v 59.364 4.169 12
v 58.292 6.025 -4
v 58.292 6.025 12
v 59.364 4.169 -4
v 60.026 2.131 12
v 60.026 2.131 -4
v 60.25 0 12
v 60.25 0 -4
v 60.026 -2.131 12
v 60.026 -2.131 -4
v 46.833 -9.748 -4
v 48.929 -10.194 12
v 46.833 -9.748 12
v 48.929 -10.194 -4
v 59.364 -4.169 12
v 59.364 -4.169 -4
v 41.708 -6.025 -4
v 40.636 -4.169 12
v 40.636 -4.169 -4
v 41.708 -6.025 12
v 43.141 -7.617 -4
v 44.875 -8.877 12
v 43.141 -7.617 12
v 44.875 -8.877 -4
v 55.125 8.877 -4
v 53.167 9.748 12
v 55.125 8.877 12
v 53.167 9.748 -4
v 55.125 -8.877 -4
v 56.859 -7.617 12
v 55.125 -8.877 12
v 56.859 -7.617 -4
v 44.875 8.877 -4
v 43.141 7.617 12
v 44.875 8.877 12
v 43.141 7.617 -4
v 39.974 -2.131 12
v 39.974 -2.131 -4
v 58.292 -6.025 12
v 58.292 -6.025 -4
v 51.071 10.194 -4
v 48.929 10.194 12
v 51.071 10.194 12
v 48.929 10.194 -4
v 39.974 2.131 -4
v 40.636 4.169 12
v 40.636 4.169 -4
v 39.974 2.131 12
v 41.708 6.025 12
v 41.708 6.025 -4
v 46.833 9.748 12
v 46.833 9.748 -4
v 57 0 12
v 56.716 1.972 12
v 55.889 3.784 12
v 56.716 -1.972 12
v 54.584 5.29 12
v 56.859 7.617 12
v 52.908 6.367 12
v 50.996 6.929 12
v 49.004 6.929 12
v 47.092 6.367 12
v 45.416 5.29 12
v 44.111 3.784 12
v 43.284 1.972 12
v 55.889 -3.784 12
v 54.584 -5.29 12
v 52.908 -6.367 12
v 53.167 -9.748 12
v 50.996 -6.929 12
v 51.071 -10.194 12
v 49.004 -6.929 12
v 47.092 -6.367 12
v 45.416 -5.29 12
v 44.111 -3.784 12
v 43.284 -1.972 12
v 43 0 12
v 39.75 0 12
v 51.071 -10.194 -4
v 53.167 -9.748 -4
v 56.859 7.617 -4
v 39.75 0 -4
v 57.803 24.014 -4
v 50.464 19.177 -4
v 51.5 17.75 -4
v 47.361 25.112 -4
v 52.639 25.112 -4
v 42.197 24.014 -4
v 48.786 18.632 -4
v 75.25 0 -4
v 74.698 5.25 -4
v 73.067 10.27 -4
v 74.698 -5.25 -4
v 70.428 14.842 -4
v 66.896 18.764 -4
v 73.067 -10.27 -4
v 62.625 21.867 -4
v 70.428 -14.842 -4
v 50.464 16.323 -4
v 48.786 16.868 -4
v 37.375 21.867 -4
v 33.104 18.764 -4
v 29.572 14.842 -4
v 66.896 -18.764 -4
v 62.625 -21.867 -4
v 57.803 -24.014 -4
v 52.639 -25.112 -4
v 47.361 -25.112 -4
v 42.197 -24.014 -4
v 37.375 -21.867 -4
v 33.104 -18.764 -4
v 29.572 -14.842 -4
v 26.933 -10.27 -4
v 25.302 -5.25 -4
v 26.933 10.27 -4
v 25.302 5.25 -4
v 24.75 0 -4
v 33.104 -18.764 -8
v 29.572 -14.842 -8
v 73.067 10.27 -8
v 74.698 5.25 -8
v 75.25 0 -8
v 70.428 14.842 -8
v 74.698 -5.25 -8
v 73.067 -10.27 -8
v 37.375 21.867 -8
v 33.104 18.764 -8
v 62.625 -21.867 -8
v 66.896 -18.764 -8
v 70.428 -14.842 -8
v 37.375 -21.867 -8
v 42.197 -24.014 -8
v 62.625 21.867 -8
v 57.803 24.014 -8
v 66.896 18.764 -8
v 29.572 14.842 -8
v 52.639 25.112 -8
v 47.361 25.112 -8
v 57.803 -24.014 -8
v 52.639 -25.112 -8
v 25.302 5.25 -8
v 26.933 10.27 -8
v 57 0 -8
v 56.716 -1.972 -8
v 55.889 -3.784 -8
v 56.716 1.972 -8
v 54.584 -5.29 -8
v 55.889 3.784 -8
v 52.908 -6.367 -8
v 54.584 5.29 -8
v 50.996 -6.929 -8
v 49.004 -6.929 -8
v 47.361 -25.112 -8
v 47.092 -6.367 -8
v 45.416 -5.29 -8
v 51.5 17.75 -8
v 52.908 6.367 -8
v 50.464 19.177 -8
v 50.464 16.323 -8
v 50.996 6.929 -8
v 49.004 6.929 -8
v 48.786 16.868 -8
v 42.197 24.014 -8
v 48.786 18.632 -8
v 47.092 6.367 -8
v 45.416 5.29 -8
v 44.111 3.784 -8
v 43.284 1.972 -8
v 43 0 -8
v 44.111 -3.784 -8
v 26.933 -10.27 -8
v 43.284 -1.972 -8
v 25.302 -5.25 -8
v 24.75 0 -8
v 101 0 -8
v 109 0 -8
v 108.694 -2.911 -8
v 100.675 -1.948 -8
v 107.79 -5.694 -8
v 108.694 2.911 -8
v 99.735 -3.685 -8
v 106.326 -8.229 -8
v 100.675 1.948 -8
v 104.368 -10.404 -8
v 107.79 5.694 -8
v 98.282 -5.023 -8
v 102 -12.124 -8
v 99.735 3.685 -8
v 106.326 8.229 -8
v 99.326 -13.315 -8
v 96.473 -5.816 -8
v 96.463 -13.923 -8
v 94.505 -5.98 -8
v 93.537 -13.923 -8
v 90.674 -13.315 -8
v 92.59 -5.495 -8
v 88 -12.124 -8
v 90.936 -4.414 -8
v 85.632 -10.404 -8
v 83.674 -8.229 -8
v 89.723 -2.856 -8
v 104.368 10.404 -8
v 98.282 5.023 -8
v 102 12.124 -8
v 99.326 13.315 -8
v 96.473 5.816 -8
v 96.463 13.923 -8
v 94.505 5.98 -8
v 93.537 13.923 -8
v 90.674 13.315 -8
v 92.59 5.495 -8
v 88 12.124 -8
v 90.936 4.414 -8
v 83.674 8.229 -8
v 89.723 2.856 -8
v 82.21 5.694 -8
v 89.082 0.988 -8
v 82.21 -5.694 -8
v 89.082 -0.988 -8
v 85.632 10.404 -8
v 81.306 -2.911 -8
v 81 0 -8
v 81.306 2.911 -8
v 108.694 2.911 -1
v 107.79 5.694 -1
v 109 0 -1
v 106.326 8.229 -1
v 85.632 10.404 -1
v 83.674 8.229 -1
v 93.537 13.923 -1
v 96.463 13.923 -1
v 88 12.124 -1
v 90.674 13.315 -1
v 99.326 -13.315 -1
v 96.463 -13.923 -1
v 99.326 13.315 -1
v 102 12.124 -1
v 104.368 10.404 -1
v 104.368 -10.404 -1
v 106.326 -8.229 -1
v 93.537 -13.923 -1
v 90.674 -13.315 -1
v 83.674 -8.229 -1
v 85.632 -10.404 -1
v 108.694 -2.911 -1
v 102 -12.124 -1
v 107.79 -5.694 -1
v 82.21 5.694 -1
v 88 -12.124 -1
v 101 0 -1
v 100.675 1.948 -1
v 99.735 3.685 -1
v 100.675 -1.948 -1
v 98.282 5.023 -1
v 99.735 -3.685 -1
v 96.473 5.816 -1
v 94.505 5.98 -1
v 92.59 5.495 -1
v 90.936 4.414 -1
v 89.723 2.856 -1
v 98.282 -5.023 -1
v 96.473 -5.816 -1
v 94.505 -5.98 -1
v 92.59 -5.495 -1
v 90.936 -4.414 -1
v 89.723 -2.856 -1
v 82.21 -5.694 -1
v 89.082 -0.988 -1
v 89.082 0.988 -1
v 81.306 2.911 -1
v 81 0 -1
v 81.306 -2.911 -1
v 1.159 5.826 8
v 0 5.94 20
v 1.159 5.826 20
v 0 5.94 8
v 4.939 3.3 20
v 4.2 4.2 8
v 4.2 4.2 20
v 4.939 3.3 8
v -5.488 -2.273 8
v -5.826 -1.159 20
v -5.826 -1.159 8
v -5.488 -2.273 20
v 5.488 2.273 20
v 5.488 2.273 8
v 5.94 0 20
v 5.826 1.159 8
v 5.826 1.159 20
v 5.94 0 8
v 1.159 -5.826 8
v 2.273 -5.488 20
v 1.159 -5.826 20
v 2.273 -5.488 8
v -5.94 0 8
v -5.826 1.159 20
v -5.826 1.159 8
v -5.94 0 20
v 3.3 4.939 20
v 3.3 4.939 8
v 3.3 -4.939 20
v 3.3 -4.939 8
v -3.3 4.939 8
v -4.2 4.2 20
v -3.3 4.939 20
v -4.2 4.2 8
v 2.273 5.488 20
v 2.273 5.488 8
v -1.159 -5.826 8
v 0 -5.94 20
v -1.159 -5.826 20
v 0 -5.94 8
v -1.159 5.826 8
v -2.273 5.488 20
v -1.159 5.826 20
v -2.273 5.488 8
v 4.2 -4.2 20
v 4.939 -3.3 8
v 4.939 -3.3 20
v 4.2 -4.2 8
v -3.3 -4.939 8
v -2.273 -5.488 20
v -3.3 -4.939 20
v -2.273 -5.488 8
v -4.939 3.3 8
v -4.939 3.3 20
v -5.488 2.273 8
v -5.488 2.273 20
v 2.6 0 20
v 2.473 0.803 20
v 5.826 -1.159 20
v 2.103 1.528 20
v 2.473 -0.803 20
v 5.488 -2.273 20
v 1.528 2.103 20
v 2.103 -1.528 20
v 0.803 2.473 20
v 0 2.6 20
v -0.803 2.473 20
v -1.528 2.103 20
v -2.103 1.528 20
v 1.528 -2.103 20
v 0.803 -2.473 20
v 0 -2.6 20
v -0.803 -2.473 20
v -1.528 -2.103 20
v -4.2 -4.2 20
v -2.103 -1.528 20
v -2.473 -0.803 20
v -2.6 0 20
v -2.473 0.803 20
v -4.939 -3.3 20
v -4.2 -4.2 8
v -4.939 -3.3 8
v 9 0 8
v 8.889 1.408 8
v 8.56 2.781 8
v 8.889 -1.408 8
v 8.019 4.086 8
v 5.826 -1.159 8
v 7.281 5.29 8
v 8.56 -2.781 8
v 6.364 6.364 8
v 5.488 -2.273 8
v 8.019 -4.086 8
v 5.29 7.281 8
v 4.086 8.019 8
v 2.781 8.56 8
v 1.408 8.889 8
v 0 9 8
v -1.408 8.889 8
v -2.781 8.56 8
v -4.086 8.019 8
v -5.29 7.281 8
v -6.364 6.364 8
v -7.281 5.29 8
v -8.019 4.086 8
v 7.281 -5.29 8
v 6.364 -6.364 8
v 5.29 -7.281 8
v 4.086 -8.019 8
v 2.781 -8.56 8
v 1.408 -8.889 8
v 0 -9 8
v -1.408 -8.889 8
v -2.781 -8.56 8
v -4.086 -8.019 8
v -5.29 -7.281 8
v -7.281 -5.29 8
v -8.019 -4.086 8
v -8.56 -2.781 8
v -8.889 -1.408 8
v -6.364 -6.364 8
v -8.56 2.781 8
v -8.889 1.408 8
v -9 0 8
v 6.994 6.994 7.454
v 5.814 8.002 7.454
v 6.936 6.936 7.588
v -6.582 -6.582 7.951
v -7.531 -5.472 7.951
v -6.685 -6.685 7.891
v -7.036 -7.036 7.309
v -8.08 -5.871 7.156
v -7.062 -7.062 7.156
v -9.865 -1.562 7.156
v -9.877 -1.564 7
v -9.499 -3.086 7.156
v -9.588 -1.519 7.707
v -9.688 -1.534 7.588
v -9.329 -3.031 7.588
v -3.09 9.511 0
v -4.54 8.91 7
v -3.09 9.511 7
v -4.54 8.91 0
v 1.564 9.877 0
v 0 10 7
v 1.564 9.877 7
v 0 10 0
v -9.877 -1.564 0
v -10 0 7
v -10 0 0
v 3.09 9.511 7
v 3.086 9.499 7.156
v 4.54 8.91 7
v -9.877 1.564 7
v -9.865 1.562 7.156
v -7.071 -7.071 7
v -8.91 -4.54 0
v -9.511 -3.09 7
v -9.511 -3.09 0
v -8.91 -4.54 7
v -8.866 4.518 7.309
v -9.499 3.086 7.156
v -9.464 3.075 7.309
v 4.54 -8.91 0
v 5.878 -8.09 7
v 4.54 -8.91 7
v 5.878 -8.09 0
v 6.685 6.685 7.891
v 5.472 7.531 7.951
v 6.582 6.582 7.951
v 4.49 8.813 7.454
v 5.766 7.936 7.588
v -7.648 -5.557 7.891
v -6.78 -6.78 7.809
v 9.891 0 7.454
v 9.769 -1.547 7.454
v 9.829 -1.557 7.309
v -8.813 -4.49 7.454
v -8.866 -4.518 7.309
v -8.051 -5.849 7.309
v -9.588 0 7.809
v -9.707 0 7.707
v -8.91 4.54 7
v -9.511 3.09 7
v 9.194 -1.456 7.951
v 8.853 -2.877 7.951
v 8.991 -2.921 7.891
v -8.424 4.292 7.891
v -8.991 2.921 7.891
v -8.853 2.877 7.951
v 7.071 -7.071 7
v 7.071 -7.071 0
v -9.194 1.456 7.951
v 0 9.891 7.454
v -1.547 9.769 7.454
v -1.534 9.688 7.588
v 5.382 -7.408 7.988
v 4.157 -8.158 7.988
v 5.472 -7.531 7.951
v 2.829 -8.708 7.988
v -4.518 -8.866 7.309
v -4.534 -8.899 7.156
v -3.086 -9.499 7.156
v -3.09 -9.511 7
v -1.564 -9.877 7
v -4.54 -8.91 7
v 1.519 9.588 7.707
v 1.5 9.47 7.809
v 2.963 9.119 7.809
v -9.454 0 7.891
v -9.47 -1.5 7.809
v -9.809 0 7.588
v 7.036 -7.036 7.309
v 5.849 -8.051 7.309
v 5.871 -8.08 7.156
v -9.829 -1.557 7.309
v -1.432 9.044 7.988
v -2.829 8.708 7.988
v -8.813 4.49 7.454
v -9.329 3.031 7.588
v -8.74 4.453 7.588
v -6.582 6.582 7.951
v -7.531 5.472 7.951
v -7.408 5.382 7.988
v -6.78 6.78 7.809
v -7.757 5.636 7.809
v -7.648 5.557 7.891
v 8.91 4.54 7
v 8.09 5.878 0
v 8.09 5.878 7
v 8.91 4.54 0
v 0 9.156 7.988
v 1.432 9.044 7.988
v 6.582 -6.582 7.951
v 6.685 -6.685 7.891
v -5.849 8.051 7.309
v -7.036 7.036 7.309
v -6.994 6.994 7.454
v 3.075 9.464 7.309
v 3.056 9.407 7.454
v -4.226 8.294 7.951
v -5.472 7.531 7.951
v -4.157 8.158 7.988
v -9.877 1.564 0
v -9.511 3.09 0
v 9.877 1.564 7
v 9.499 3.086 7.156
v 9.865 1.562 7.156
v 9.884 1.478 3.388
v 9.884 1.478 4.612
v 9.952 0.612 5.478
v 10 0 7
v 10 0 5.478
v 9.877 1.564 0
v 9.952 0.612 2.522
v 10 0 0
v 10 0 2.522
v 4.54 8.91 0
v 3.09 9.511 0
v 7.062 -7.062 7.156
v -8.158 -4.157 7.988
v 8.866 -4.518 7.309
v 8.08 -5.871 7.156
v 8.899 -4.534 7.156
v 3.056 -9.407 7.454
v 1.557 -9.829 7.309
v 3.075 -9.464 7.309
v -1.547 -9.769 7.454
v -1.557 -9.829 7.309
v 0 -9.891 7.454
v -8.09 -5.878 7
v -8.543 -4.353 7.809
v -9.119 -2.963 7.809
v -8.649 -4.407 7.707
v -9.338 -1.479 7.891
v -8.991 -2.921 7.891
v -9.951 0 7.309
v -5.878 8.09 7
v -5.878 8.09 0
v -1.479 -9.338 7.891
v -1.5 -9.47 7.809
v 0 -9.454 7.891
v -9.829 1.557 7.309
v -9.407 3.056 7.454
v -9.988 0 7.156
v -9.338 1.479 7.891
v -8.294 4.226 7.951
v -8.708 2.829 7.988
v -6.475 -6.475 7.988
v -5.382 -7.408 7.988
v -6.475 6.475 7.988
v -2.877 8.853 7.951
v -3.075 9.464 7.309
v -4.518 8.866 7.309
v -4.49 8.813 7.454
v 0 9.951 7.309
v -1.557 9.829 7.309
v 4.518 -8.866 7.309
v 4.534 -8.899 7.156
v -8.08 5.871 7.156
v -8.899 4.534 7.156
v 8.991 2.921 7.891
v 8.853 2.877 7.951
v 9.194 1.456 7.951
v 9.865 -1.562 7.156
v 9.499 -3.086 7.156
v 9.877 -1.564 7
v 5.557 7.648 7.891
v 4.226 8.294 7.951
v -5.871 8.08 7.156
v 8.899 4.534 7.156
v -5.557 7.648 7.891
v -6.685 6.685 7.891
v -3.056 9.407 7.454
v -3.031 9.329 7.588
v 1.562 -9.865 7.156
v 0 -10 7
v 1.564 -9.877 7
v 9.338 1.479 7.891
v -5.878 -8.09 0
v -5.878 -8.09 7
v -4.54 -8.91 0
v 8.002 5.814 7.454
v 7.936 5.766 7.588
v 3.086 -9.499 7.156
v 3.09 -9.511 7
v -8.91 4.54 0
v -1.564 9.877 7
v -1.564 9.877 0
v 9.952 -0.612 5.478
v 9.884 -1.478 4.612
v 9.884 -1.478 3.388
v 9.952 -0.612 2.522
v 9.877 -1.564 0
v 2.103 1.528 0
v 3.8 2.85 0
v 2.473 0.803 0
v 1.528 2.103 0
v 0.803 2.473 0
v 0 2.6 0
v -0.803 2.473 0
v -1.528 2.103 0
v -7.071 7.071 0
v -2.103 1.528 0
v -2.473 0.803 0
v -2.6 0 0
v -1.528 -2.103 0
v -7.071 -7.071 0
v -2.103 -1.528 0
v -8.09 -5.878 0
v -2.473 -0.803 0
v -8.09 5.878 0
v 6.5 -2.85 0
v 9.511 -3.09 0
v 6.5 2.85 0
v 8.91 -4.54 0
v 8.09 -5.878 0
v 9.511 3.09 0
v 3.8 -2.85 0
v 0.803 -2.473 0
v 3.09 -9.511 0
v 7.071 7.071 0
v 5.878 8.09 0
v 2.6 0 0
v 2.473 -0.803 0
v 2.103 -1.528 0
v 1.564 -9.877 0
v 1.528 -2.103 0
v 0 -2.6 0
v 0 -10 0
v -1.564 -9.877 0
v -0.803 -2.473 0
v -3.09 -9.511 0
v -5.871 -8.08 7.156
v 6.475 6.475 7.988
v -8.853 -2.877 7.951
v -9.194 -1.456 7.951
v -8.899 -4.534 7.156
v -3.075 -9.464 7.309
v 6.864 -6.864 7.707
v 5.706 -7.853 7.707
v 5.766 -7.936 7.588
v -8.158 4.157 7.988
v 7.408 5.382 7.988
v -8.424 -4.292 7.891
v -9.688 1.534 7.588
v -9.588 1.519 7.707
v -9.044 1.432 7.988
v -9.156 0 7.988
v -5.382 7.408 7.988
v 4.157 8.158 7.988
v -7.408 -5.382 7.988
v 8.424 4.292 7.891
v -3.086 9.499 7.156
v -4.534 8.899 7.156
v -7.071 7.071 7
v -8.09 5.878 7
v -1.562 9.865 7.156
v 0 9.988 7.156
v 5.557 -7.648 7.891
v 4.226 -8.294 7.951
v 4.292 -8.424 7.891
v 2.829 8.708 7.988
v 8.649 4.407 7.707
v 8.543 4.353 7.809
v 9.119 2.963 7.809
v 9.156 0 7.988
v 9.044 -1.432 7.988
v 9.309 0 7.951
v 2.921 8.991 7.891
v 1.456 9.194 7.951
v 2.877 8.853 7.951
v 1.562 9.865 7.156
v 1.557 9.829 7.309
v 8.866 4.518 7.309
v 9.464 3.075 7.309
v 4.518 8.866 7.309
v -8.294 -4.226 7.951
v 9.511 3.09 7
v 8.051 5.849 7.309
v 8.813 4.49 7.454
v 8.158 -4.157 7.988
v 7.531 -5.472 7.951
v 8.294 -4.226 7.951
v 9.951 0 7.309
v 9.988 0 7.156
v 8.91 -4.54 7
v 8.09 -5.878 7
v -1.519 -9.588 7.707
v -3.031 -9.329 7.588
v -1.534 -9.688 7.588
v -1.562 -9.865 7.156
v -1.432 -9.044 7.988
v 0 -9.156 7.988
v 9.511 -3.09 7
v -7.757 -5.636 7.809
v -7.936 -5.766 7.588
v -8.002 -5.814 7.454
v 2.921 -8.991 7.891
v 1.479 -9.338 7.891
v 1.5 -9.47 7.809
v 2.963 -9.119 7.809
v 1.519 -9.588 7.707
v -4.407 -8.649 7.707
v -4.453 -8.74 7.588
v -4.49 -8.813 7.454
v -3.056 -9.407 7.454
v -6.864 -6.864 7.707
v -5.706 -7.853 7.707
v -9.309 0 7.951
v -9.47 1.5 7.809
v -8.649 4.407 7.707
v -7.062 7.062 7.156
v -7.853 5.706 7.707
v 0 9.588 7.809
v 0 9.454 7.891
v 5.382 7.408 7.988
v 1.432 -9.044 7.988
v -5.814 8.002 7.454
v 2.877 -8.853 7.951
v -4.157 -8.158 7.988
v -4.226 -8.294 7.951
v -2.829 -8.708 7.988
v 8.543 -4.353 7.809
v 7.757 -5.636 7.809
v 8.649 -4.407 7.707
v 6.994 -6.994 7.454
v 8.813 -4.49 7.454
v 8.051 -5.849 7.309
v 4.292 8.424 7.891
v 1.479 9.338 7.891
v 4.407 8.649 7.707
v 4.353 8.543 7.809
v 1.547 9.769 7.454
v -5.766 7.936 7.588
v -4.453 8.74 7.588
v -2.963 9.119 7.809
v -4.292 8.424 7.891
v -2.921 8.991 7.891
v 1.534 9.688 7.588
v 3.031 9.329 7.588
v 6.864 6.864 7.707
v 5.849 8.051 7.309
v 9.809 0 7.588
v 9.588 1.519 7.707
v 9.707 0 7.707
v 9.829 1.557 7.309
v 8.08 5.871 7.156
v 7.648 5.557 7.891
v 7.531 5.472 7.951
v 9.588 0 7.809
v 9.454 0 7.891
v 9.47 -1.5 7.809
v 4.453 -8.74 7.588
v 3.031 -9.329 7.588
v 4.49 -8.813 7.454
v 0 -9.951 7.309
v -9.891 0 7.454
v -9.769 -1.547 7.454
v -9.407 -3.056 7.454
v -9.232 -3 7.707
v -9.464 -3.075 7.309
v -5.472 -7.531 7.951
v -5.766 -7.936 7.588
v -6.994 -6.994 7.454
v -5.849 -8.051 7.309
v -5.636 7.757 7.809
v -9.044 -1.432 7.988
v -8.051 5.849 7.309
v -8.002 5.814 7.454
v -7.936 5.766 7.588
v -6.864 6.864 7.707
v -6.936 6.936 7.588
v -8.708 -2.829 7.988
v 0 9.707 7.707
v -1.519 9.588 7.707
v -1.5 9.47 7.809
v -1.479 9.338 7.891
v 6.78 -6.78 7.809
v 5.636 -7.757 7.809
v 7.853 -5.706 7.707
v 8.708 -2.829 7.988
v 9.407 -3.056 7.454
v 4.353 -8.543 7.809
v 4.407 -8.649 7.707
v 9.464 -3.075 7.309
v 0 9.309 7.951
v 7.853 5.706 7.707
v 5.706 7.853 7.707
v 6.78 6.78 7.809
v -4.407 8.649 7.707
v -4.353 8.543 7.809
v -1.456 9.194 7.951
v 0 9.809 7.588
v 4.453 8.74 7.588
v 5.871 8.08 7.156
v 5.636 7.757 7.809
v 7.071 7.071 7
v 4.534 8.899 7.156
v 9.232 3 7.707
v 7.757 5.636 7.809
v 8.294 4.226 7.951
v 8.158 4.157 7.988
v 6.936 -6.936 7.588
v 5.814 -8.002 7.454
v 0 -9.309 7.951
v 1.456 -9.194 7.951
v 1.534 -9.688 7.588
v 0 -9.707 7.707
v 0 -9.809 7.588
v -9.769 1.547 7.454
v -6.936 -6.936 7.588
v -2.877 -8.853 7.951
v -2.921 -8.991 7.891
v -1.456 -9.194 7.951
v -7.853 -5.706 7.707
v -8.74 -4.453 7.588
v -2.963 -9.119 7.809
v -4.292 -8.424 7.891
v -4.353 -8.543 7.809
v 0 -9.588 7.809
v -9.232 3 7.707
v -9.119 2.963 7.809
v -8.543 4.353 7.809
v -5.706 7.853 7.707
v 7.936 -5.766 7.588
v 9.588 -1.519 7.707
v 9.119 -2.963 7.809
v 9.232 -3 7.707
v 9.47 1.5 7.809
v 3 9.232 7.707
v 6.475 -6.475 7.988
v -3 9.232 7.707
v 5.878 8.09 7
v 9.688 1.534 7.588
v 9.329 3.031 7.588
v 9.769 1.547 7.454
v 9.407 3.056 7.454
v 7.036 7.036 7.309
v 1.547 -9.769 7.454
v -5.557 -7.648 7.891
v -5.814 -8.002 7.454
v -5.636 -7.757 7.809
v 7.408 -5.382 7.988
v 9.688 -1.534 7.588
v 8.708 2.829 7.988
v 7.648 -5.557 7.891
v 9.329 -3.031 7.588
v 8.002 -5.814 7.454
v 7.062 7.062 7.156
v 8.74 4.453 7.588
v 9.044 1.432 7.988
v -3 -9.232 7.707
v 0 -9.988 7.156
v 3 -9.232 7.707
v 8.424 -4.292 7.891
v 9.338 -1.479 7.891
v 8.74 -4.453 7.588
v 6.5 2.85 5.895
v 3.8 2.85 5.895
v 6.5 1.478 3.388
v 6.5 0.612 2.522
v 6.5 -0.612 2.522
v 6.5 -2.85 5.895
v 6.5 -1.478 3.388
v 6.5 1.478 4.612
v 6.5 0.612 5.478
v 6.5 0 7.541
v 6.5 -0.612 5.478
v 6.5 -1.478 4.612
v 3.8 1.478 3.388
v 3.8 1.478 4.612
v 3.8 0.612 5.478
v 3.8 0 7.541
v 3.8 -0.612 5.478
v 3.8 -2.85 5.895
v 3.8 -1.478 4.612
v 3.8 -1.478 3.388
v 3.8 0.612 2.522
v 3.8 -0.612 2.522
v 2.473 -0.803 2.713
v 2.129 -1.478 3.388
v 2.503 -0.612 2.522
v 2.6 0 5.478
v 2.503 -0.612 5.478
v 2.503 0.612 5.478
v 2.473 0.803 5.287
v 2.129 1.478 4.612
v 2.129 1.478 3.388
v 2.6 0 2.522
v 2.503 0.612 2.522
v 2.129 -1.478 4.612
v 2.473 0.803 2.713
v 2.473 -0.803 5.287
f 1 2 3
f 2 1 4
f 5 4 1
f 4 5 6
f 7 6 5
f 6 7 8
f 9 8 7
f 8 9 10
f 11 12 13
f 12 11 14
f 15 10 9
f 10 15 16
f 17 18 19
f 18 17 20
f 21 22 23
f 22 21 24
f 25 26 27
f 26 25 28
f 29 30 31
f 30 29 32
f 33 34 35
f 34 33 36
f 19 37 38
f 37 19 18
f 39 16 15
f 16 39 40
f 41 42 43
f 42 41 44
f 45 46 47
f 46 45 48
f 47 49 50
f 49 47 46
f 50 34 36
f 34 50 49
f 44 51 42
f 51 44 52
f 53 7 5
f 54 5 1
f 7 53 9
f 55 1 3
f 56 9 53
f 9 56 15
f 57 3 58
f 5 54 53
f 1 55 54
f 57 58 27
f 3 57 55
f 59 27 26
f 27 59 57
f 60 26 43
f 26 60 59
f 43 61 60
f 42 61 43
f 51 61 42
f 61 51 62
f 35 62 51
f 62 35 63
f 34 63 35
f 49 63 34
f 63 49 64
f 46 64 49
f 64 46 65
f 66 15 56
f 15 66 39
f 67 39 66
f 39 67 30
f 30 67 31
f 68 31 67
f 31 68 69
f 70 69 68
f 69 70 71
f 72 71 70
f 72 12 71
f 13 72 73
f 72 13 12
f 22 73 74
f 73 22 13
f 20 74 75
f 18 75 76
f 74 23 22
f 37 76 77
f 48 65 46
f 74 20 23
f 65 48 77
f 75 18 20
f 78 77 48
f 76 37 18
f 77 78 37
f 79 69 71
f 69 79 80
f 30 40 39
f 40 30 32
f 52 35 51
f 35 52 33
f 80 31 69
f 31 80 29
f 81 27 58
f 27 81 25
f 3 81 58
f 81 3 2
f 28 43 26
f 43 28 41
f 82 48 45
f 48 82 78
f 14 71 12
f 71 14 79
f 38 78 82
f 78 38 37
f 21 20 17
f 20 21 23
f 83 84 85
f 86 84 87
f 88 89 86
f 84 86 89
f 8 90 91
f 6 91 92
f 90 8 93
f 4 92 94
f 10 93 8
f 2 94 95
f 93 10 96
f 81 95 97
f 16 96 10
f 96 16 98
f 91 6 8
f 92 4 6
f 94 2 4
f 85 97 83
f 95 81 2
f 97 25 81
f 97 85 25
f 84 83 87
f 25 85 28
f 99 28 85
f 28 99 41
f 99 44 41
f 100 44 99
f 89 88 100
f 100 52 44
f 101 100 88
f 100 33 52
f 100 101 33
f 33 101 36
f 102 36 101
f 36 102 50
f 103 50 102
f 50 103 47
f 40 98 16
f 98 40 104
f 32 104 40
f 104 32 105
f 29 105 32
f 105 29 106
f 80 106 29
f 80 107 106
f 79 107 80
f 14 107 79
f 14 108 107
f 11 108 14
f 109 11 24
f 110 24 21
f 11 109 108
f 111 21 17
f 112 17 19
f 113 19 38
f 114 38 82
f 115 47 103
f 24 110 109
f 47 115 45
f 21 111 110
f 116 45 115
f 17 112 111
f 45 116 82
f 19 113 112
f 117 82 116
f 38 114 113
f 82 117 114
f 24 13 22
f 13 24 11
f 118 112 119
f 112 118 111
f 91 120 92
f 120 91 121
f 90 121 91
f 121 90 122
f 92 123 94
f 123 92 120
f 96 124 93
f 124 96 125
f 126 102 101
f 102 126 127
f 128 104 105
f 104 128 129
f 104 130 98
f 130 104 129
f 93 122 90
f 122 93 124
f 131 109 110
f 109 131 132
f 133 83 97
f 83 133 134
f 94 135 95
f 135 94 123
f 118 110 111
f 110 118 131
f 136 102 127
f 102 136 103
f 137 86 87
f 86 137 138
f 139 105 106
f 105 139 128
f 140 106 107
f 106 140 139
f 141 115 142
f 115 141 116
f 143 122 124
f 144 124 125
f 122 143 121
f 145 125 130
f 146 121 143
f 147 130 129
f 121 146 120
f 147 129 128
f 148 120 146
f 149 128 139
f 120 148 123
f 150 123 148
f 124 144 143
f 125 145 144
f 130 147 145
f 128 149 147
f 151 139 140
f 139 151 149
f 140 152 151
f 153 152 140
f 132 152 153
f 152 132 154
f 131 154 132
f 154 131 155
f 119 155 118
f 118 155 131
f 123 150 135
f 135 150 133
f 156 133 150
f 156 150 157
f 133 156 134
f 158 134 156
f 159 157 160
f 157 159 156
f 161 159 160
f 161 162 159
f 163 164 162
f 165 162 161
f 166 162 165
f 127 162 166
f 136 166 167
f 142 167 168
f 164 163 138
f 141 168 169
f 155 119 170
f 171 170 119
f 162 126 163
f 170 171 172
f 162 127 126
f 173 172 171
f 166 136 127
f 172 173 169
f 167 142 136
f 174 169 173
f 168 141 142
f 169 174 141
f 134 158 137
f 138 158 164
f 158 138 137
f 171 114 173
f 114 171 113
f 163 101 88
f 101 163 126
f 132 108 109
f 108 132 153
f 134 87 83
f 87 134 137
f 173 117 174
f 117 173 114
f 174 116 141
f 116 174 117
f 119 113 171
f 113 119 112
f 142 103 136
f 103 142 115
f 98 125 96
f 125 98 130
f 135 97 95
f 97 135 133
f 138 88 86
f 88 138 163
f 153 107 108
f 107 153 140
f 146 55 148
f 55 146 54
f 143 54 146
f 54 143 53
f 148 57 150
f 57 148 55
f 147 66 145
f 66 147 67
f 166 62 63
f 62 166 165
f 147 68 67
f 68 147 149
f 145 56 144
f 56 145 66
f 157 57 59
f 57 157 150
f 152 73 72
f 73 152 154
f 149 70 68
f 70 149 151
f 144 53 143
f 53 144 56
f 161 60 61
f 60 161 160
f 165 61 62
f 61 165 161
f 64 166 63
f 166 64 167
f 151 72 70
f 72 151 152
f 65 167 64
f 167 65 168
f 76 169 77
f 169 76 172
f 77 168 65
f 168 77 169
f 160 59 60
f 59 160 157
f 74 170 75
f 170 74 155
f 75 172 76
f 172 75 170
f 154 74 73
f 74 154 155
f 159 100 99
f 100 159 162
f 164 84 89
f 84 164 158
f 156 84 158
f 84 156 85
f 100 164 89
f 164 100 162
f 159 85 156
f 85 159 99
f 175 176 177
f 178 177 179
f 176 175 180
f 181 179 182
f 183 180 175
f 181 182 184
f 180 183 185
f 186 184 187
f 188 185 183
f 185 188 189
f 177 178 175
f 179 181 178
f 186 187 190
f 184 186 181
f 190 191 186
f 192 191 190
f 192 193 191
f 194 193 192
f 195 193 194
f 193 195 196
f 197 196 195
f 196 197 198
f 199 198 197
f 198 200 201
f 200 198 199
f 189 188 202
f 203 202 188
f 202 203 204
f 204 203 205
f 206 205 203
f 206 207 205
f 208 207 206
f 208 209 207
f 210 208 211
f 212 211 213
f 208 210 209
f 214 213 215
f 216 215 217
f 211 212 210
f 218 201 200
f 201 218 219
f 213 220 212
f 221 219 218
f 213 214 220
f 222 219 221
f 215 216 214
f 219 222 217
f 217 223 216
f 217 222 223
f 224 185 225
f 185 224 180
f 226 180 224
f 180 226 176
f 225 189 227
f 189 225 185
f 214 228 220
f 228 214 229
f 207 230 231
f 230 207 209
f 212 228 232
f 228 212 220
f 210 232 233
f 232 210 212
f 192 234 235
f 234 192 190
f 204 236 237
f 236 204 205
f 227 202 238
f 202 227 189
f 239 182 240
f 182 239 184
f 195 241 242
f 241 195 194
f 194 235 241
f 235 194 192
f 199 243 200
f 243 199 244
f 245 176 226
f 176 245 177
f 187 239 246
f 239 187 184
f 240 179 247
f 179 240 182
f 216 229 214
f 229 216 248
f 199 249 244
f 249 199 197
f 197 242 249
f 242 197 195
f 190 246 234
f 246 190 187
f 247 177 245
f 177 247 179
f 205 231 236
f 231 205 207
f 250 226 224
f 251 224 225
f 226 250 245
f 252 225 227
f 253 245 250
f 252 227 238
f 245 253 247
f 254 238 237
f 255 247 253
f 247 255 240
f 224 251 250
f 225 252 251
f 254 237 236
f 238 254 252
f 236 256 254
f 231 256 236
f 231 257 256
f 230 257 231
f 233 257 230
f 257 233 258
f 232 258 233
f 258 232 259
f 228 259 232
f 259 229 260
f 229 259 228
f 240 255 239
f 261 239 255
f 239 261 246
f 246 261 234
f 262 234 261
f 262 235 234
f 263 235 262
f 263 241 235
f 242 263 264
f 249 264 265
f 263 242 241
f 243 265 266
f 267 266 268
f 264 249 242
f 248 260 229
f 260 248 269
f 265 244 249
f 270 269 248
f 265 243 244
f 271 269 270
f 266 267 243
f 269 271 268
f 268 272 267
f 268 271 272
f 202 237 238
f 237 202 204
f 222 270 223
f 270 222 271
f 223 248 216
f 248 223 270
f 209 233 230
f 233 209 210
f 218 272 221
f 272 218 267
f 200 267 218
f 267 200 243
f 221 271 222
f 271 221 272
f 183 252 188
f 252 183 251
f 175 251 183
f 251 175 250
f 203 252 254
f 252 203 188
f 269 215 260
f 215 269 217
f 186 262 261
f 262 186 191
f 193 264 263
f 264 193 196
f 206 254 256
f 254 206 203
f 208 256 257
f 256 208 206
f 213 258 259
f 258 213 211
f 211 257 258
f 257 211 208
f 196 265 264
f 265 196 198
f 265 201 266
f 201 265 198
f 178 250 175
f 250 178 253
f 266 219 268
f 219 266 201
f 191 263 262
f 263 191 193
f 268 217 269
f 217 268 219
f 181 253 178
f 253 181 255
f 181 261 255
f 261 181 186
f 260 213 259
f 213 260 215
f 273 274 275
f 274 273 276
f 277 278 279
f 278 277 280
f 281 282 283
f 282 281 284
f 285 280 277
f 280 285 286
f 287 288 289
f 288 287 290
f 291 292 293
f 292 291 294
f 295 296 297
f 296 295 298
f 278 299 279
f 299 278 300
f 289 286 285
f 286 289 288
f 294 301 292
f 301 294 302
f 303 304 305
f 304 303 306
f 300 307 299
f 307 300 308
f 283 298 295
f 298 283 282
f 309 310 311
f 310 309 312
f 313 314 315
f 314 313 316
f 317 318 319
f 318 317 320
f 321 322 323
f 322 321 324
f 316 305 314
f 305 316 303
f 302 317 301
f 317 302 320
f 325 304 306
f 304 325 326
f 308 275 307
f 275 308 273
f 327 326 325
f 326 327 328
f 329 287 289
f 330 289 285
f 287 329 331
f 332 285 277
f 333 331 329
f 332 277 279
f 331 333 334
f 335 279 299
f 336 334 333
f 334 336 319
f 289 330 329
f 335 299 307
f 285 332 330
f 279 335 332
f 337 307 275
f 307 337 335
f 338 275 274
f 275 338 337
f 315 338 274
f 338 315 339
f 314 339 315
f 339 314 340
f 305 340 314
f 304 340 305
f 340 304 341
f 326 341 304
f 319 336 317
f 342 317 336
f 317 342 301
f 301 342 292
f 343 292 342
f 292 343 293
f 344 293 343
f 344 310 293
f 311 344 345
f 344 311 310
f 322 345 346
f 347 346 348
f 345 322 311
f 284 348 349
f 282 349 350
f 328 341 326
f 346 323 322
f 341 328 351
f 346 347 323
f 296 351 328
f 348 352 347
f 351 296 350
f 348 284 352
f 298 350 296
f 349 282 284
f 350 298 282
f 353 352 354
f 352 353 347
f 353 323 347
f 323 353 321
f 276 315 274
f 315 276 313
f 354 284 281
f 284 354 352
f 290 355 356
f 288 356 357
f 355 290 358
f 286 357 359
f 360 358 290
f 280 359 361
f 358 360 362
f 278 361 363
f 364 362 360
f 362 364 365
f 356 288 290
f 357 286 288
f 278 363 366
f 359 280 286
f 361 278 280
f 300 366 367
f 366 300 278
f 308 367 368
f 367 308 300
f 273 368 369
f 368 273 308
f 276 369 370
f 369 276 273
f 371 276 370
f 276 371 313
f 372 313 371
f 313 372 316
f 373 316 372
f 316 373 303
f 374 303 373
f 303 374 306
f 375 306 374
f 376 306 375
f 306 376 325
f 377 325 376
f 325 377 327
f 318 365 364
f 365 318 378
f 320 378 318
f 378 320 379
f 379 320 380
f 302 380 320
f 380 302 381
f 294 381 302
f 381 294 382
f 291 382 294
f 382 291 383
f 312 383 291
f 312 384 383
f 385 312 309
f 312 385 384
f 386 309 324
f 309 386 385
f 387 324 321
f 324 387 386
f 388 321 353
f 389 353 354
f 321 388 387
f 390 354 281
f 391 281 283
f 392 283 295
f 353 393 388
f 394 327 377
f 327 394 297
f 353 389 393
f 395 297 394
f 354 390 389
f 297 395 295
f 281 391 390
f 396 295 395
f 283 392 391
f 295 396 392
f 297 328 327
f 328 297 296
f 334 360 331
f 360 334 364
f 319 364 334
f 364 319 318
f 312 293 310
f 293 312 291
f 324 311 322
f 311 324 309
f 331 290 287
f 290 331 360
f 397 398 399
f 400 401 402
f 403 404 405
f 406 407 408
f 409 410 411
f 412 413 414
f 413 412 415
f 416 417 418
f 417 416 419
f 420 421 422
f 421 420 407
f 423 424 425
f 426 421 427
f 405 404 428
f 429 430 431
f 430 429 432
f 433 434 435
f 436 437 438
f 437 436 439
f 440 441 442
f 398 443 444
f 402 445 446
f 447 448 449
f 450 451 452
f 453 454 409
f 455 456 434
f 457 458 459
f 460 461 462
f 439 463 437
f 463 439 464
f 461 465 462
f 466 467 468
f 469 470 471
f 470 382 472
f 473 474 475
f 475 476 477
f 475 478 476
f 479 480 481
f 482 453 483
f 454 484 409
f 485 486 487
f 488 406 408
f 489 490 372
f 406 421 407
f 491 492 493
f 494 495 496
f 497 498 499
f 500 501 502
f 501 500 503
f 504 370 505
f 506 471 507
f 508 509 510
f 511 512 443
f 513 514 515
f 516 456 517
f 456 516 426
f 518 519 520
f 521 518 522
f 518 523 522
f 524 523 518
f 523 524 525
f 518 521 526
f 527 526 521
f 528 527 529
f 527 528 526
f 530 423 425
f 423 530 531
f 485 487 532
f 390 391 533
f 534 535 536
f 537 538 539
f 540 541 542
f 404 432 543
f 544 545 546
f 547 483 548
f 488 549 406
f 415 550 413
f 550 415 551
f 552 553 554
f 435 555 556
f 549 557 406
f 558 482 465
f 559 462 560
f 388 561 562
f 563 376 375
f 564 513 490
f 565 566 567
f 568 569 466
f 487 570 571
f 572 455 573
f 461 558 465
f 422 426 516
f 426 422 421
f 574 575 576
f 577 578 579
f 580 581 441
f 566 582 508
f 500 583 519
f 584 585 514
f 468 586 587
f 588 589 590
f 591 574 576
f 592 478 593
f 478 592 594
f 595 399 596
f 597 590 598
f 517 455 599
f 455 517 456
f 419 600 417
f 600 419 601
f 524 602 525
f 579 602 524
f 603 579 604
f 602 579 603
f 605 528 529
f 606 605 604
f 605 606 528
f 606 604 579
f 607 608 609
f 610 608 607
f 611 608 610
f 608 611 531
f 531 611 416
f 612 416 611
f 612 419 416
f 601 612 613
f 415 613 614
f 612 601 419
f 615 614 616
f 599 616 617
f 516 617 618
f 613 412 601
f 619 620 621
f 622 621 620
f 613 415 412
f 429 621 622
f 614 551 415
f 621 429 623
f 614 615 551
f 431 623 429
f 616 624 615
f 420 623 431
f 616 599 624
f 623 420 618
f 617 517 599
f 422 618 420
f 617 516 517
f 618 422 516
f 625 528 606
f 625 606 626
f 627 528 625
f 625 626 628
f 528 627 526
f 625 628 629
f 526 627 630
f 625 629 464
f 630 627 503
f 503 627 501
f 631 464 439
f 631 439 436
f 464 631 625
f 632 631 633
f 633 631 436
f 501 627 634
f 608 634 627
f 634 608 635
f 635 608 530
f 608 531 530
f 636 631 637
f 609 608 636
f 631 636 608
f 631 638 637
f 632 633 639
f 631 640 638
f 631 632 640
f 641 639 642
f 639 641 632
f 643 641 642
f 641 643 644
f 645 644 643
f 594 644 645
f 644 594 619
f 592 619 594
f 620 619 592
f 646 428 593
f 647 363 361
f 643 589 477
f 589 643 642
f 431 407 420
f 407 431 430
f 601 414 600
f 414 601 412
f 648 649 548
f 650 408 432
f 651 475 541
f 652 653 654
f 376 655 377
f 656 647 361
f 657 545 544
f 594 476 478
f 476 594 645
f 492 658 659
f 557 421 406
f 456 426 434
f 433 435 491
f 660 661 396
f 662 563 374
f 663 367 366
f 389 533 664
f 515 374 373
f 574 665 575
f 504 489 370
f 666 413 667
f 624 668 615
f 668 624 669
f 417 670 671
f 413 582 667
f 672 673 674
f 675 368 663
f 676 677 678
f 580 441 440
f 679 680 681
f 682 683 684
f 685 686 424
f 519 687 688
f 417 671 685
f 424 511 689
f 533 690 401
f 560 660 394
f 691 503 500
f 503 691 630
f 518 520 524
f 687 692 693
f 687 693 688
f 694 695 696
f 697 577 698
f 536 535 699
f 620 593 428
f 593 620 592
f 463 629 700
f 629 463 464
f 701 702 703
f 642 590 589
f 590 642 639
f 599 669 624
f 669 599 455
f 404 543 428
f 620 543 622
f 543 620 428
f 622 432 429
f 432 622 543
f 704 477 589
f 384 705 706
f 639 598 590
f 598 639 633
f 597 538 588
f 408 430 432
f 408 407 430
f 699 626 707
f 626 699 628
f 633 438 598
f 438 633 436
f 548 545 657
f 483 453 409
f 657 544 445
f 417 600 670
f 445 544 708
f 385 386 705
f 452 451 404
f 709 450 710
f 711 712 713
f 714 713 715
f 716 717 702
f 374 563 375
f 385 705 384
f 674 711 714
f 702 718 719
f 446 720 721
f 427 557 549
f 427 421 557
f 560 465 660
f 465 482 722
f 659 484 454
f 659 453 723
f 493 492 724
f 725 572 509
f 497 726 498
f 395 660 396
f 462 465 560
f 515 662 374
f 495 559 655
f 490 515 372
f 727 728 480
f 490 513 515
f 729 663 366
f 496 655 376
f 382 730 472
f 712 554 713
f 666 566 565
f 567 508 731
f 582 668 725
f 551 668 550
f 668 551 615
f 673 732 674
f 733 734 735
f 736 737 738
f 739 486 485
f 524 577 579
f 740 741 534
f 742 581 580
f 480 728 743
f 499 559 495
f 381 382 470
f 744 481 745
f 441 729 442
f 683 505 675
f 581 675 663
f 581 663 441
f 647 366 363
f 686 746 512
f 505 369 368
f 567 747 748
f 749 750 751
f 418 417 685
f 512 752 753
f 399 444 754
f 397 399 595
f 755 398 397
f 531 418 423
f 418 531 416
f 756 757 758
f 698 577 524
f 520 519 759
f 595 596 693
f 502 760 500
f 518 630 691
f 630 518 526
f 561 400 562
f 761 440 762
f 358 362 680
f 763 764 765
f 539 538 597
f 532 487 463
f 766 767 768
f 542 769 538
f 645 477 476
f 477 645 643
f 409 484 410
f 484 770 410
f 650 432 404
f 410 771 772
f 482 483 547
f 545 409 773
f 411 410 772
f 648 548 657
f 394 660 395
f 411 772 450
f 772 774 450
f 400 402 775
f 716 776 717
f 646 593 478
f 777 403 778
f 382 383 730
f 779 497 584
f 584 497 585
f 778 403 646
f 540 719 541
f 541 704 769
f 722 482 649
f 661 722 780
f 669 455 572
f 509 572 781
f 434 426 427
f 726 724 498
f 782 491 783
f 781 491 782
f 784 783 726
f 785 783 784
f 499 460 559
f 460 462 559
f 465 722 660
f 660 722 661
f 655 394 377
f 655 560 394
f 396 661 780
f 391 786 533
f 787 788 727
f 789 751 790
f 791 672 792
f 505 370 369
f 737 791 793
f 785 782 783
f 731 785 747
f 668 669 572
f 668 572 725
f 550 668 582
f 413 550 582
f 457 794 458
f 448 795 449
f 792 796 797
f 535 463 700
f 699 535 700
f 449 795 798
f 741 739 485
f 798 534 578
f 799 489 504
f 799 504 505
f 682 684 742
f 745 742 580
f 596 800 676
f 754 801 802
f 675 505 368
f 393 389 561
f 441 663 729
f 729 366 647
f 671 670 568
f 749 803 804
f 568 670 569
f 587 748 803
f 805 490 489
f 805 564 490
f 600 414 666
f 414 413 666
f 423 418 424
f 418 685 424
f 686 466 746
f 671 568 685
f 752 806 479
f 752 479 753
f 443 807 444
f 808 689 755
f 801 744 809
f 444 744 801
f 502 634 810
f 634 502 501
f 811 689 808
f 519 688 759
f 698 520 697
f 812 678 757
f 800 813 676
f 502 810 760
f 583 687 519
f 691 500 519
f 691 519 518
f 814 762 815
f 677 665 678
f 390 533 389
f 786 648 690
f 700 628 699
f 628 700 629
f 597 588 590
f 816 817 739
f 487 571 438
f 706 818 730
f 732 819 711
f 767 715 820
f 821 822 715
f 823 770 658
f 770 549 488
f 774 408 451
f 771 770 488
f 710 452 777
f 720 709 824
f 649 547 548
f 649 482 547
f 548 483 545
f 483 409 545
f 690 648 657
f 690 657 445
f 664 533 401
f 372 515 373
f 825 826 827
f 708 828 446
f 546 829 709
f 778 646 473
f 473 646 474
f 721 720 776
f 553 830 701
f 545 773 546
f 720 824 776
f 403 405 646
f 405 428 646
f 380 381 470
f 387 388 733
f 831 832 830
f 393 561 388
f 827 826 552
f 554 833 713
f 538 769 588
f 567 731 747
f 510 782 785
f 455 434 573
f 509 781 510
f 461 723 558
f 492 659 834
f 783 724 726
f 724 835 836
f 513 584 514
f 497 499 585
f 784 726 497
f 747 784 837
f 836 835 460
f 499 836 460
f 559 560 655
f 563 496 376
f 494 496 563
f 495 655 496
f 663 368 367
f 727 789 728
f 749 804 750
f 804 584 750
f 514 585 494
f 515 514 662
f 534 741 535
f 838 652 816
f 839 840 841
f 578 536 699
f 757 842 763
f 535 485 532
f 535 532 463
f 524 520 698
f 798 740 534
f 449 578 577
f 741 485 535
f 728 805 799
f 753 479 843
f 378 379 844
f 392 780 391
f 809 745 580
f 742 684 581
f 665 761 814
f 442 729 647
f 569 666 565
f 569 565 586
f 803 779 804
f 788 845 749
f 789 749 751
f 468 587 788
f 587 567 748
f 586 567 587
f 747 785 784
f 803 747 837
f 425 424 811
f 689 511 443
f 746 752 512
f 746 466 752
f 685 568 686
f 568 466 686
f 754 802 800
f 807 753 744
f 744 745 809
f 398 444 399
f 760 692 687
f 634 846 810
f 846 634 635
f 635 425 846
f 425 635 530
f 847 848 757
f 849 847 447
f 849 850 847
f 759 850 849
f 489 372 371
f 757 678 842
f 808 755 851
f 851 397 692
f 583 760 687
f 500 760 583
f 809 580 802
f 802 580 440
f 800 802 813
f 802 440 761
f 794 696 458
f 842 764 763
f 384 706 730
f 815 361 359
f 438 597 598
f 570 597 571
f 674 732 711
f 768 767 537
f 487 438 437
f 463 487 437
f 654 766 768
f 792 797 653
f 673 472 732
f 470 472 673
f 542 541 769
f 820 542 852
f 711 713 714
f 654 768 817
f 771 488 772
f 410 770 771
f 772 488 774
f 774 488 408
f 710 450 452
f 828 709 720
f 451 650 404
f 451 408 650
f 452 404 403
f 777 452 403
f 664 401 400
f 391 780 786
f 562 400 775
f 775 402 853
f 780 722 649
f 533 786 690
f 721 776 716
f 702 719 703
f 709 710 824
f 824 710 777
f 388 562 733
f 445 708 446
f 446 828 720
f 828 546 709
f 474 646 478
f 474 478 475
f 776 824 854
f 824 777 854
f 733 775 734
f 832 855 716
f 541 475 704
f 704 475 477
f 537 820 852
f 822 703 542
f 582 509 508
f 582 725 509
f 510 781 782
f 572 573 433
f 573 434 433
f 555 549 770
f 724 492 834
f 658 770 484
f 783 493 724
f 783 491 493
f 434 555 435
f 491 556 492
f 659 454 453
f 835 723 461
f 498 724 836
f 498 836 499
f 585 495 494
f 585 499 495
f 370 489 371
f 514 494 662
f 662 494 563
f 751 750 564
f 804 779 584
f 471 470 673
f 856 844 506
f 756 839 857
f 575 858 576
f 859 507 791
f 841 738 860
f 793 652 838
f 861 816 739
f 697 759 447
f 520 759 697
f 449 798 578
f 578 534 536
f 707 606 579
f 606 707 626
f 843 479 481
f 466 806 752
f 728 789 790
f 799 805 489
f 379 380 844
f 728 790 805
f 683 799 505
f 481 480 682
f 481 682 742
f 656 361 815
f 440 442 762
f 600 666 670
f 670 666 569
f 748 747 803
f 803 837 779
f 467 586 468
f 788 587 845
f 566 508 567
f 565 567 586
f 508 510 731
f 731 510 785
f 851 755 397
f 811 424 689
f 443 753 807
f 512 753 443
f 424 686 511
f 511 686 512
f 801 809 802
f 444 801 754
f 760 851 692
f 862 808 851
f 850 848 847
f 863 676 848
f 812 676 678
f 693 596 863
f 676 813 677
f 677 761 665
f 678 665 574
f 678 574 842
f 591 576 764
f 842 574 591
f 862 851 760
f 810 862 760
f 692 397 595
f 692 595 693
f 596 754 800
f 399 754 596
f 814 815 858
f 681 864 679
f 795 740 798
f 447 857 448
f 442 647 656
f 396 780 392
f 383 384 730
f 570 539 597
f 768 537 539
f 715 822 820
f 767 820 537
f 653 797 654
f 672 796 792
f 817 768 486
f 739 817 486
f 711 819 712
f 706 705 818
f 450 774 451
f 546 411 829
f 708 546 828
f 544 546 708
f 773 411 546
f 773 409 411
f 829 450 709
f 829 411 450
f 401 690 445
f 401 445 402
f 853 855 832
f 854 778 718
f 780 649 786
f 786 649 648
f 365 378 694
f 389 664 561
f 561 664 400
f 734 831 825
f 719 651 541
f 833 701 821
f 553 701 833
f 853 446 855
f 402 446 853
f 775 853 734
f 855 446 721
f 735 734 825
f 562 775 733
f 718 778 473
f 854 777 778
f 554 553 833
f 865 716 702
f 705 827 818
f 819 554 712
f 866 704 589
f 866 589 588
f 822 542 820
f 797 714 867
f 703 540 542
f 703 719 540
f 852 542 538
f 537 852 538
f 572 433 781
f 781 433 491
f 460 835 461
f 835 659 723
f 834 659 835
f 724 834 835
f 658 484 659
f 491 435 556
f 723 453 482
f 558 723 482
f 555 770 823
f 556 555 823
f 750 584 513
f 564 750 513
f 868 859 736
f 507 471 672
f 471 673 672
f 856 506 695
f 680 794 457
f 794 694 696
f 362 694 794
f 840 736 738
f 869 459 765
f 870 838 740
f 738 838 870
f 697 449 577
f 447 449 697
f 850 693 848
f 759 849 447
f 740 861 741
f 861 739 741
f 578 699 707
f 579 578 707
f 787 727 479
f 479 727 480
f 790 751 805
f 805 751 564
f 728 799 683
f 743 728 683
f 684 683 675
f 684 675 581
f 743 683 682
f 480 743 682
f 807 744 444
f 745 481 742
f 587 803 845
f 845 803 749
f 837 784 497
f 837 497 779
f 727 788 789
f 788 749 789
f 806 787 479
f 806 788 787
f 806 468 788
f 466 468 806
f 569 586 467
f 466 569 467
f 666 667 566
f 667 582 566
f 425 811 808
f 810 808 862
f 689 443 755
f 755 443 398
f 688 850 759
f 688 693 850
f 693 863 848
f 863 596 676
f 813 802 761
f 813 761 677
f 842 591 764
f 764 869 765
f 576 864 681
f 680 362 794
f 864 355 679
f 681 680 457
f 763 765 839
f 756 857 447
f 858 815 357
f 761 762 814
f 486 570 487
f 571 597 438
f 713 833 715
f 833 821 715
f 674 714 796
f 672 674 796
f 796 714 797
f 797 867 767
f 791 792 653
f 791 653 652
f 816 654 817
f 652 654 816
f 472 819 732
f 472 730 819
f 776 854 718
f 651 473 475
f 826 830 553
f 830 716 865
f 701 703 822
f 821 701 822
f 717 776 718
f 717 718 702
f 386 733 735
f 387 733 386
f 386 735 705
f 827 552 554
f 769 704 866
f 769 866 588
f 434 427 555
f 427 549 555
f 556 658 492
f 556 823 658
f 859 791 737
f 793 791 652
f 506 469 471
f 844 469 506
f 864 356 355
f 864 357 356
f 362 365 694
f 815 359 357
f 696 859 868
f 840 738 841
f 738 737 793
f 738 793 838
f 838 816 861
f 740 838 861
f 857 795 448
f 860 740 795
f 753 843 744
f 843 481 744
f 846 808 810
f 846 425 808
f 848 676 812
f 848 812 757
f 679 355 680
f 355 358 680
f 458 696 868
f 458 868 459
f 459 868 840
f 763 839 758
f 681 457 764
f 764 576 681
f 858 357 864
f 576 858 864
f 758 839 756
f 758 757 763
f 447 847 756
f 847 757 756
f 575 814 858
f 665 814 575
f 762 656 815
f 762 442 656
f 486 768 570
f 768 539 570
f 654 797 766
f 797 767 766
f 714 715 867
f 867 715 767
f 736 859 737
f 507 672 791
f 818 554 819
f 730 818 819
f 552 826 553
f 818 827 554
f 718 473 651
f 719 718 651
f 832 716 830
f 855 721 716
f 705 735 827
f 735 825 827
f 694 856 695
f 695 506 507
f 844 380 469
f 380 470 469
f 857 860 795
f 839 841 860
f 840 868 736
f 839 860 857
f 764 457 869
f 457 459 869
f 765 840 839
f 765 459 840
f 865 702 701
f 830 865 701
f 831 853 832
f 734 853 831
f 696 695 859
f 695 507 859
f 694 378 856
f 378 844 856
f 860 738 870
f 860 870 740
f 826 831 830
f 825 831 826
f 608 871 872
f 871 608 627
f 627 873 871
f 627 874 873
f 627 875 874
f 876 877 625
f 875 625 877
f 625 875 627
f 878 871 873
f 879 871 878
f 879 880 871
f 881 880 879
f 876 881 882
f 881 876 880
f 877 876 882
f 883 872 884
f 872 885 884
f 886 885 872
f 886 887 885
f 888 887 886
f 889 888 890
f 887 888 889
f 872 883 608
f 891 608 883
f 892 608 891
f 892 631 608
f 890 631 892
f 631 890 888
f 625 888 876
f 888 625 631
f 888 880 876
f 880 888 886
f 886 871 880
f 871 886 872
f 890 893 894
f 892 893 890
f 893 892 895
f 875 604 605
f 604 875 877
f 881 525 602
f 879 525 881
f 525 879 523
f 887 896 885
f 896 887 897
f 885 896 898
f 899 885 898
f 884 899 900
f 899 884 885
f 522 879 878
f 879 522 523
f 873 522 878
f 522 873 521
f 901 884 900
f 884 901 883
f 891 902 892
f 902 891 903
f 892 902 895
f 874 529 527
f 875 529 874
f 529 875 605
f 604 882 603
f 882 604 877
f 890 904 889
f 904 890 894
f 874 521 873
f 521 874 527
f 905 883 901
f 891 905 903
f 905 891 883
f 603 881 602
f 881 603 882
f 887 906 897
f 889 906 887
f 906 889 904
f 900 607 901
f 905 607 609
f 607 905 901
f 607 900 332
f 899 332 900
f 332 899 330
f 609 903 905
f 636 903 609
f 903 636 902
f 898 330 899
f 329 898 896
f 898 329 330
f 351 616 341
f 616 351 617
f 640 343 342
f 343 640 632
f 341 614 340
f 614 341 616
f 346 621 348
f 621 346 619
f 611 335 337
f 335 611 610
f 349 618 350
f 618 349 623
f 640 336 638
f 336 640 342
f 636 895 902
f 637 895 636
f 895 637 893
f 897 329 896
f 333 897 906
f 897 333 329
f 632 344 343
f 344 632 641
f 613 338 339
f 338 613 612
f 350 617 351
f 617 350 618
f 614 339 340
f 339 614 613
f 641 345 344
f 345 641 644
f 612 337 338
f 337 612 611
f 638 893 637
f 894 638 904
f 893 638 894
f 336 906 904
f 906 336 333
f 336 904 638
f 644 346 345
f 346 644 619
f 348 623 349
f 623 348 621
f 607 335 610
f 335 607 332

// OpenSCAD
include<MCAD/nuts_and_bolts.scad>;



//hole = 7.9375;
//screw_hole = 30;
//holes = 10;

translate([50,0,0]) 
{
difference()
{


union()
{
	//scale([1,1,2]) translate([0,0,4]) nutHole(10, proj=-1);
	translate([0,0,4])  cylinder(r=10.25,h=16,center=true);
	translate([0,0,-6])  cylinder(r=25.25,h=4,center=true);
	//translate([11,-6,17])  rotate([30,90,0]) cylinder(r=2,h=8,center=true);
}

translate([0,0,0])  cylinder(r=7,h=50,center=true);

translate([0,17.75,-6])  cylinder(r=1.5,h=6,center=true);
}


difference()
{


translate([45,0,-4.5])  cylinder(r=14,h=7,center=true);

translate([45,0,0])  cylinder(r=6,h=50,center=true);

}}



teeth = 20;			// Number of teeth, standard Mendel T5 belt = 8, gives Outside Diameter of 11.88mm
profile = 3;		// 1=MXL 2=40DP 3=XL 4=H 5=T2.5 6=T5 7=T10 8=AT5 9=HTD_3mm 10=HTD_5mm 11=HTD_8mm 12=GT2_2mm 13=GT2_3mm 14=GT2_5mm

motor_shaft = 12;	// NEMA17 motor shaft exact diameter = 5
m3_dia = 3.2;		// 3mm hole diameter
m3_nut_hex = 1;		// 1 for hex, 0 for square nut
m3_nut_flats = 5.7;	// normal M3 hex nut exact width = 5.5
m3_nut_depth = 2.7;	// normal M3 hex nut exact depth = 2.4, nyloc = 4

include<Pulley_T-MXL-XL-HTD-GT2_N-tooth.scad>;
